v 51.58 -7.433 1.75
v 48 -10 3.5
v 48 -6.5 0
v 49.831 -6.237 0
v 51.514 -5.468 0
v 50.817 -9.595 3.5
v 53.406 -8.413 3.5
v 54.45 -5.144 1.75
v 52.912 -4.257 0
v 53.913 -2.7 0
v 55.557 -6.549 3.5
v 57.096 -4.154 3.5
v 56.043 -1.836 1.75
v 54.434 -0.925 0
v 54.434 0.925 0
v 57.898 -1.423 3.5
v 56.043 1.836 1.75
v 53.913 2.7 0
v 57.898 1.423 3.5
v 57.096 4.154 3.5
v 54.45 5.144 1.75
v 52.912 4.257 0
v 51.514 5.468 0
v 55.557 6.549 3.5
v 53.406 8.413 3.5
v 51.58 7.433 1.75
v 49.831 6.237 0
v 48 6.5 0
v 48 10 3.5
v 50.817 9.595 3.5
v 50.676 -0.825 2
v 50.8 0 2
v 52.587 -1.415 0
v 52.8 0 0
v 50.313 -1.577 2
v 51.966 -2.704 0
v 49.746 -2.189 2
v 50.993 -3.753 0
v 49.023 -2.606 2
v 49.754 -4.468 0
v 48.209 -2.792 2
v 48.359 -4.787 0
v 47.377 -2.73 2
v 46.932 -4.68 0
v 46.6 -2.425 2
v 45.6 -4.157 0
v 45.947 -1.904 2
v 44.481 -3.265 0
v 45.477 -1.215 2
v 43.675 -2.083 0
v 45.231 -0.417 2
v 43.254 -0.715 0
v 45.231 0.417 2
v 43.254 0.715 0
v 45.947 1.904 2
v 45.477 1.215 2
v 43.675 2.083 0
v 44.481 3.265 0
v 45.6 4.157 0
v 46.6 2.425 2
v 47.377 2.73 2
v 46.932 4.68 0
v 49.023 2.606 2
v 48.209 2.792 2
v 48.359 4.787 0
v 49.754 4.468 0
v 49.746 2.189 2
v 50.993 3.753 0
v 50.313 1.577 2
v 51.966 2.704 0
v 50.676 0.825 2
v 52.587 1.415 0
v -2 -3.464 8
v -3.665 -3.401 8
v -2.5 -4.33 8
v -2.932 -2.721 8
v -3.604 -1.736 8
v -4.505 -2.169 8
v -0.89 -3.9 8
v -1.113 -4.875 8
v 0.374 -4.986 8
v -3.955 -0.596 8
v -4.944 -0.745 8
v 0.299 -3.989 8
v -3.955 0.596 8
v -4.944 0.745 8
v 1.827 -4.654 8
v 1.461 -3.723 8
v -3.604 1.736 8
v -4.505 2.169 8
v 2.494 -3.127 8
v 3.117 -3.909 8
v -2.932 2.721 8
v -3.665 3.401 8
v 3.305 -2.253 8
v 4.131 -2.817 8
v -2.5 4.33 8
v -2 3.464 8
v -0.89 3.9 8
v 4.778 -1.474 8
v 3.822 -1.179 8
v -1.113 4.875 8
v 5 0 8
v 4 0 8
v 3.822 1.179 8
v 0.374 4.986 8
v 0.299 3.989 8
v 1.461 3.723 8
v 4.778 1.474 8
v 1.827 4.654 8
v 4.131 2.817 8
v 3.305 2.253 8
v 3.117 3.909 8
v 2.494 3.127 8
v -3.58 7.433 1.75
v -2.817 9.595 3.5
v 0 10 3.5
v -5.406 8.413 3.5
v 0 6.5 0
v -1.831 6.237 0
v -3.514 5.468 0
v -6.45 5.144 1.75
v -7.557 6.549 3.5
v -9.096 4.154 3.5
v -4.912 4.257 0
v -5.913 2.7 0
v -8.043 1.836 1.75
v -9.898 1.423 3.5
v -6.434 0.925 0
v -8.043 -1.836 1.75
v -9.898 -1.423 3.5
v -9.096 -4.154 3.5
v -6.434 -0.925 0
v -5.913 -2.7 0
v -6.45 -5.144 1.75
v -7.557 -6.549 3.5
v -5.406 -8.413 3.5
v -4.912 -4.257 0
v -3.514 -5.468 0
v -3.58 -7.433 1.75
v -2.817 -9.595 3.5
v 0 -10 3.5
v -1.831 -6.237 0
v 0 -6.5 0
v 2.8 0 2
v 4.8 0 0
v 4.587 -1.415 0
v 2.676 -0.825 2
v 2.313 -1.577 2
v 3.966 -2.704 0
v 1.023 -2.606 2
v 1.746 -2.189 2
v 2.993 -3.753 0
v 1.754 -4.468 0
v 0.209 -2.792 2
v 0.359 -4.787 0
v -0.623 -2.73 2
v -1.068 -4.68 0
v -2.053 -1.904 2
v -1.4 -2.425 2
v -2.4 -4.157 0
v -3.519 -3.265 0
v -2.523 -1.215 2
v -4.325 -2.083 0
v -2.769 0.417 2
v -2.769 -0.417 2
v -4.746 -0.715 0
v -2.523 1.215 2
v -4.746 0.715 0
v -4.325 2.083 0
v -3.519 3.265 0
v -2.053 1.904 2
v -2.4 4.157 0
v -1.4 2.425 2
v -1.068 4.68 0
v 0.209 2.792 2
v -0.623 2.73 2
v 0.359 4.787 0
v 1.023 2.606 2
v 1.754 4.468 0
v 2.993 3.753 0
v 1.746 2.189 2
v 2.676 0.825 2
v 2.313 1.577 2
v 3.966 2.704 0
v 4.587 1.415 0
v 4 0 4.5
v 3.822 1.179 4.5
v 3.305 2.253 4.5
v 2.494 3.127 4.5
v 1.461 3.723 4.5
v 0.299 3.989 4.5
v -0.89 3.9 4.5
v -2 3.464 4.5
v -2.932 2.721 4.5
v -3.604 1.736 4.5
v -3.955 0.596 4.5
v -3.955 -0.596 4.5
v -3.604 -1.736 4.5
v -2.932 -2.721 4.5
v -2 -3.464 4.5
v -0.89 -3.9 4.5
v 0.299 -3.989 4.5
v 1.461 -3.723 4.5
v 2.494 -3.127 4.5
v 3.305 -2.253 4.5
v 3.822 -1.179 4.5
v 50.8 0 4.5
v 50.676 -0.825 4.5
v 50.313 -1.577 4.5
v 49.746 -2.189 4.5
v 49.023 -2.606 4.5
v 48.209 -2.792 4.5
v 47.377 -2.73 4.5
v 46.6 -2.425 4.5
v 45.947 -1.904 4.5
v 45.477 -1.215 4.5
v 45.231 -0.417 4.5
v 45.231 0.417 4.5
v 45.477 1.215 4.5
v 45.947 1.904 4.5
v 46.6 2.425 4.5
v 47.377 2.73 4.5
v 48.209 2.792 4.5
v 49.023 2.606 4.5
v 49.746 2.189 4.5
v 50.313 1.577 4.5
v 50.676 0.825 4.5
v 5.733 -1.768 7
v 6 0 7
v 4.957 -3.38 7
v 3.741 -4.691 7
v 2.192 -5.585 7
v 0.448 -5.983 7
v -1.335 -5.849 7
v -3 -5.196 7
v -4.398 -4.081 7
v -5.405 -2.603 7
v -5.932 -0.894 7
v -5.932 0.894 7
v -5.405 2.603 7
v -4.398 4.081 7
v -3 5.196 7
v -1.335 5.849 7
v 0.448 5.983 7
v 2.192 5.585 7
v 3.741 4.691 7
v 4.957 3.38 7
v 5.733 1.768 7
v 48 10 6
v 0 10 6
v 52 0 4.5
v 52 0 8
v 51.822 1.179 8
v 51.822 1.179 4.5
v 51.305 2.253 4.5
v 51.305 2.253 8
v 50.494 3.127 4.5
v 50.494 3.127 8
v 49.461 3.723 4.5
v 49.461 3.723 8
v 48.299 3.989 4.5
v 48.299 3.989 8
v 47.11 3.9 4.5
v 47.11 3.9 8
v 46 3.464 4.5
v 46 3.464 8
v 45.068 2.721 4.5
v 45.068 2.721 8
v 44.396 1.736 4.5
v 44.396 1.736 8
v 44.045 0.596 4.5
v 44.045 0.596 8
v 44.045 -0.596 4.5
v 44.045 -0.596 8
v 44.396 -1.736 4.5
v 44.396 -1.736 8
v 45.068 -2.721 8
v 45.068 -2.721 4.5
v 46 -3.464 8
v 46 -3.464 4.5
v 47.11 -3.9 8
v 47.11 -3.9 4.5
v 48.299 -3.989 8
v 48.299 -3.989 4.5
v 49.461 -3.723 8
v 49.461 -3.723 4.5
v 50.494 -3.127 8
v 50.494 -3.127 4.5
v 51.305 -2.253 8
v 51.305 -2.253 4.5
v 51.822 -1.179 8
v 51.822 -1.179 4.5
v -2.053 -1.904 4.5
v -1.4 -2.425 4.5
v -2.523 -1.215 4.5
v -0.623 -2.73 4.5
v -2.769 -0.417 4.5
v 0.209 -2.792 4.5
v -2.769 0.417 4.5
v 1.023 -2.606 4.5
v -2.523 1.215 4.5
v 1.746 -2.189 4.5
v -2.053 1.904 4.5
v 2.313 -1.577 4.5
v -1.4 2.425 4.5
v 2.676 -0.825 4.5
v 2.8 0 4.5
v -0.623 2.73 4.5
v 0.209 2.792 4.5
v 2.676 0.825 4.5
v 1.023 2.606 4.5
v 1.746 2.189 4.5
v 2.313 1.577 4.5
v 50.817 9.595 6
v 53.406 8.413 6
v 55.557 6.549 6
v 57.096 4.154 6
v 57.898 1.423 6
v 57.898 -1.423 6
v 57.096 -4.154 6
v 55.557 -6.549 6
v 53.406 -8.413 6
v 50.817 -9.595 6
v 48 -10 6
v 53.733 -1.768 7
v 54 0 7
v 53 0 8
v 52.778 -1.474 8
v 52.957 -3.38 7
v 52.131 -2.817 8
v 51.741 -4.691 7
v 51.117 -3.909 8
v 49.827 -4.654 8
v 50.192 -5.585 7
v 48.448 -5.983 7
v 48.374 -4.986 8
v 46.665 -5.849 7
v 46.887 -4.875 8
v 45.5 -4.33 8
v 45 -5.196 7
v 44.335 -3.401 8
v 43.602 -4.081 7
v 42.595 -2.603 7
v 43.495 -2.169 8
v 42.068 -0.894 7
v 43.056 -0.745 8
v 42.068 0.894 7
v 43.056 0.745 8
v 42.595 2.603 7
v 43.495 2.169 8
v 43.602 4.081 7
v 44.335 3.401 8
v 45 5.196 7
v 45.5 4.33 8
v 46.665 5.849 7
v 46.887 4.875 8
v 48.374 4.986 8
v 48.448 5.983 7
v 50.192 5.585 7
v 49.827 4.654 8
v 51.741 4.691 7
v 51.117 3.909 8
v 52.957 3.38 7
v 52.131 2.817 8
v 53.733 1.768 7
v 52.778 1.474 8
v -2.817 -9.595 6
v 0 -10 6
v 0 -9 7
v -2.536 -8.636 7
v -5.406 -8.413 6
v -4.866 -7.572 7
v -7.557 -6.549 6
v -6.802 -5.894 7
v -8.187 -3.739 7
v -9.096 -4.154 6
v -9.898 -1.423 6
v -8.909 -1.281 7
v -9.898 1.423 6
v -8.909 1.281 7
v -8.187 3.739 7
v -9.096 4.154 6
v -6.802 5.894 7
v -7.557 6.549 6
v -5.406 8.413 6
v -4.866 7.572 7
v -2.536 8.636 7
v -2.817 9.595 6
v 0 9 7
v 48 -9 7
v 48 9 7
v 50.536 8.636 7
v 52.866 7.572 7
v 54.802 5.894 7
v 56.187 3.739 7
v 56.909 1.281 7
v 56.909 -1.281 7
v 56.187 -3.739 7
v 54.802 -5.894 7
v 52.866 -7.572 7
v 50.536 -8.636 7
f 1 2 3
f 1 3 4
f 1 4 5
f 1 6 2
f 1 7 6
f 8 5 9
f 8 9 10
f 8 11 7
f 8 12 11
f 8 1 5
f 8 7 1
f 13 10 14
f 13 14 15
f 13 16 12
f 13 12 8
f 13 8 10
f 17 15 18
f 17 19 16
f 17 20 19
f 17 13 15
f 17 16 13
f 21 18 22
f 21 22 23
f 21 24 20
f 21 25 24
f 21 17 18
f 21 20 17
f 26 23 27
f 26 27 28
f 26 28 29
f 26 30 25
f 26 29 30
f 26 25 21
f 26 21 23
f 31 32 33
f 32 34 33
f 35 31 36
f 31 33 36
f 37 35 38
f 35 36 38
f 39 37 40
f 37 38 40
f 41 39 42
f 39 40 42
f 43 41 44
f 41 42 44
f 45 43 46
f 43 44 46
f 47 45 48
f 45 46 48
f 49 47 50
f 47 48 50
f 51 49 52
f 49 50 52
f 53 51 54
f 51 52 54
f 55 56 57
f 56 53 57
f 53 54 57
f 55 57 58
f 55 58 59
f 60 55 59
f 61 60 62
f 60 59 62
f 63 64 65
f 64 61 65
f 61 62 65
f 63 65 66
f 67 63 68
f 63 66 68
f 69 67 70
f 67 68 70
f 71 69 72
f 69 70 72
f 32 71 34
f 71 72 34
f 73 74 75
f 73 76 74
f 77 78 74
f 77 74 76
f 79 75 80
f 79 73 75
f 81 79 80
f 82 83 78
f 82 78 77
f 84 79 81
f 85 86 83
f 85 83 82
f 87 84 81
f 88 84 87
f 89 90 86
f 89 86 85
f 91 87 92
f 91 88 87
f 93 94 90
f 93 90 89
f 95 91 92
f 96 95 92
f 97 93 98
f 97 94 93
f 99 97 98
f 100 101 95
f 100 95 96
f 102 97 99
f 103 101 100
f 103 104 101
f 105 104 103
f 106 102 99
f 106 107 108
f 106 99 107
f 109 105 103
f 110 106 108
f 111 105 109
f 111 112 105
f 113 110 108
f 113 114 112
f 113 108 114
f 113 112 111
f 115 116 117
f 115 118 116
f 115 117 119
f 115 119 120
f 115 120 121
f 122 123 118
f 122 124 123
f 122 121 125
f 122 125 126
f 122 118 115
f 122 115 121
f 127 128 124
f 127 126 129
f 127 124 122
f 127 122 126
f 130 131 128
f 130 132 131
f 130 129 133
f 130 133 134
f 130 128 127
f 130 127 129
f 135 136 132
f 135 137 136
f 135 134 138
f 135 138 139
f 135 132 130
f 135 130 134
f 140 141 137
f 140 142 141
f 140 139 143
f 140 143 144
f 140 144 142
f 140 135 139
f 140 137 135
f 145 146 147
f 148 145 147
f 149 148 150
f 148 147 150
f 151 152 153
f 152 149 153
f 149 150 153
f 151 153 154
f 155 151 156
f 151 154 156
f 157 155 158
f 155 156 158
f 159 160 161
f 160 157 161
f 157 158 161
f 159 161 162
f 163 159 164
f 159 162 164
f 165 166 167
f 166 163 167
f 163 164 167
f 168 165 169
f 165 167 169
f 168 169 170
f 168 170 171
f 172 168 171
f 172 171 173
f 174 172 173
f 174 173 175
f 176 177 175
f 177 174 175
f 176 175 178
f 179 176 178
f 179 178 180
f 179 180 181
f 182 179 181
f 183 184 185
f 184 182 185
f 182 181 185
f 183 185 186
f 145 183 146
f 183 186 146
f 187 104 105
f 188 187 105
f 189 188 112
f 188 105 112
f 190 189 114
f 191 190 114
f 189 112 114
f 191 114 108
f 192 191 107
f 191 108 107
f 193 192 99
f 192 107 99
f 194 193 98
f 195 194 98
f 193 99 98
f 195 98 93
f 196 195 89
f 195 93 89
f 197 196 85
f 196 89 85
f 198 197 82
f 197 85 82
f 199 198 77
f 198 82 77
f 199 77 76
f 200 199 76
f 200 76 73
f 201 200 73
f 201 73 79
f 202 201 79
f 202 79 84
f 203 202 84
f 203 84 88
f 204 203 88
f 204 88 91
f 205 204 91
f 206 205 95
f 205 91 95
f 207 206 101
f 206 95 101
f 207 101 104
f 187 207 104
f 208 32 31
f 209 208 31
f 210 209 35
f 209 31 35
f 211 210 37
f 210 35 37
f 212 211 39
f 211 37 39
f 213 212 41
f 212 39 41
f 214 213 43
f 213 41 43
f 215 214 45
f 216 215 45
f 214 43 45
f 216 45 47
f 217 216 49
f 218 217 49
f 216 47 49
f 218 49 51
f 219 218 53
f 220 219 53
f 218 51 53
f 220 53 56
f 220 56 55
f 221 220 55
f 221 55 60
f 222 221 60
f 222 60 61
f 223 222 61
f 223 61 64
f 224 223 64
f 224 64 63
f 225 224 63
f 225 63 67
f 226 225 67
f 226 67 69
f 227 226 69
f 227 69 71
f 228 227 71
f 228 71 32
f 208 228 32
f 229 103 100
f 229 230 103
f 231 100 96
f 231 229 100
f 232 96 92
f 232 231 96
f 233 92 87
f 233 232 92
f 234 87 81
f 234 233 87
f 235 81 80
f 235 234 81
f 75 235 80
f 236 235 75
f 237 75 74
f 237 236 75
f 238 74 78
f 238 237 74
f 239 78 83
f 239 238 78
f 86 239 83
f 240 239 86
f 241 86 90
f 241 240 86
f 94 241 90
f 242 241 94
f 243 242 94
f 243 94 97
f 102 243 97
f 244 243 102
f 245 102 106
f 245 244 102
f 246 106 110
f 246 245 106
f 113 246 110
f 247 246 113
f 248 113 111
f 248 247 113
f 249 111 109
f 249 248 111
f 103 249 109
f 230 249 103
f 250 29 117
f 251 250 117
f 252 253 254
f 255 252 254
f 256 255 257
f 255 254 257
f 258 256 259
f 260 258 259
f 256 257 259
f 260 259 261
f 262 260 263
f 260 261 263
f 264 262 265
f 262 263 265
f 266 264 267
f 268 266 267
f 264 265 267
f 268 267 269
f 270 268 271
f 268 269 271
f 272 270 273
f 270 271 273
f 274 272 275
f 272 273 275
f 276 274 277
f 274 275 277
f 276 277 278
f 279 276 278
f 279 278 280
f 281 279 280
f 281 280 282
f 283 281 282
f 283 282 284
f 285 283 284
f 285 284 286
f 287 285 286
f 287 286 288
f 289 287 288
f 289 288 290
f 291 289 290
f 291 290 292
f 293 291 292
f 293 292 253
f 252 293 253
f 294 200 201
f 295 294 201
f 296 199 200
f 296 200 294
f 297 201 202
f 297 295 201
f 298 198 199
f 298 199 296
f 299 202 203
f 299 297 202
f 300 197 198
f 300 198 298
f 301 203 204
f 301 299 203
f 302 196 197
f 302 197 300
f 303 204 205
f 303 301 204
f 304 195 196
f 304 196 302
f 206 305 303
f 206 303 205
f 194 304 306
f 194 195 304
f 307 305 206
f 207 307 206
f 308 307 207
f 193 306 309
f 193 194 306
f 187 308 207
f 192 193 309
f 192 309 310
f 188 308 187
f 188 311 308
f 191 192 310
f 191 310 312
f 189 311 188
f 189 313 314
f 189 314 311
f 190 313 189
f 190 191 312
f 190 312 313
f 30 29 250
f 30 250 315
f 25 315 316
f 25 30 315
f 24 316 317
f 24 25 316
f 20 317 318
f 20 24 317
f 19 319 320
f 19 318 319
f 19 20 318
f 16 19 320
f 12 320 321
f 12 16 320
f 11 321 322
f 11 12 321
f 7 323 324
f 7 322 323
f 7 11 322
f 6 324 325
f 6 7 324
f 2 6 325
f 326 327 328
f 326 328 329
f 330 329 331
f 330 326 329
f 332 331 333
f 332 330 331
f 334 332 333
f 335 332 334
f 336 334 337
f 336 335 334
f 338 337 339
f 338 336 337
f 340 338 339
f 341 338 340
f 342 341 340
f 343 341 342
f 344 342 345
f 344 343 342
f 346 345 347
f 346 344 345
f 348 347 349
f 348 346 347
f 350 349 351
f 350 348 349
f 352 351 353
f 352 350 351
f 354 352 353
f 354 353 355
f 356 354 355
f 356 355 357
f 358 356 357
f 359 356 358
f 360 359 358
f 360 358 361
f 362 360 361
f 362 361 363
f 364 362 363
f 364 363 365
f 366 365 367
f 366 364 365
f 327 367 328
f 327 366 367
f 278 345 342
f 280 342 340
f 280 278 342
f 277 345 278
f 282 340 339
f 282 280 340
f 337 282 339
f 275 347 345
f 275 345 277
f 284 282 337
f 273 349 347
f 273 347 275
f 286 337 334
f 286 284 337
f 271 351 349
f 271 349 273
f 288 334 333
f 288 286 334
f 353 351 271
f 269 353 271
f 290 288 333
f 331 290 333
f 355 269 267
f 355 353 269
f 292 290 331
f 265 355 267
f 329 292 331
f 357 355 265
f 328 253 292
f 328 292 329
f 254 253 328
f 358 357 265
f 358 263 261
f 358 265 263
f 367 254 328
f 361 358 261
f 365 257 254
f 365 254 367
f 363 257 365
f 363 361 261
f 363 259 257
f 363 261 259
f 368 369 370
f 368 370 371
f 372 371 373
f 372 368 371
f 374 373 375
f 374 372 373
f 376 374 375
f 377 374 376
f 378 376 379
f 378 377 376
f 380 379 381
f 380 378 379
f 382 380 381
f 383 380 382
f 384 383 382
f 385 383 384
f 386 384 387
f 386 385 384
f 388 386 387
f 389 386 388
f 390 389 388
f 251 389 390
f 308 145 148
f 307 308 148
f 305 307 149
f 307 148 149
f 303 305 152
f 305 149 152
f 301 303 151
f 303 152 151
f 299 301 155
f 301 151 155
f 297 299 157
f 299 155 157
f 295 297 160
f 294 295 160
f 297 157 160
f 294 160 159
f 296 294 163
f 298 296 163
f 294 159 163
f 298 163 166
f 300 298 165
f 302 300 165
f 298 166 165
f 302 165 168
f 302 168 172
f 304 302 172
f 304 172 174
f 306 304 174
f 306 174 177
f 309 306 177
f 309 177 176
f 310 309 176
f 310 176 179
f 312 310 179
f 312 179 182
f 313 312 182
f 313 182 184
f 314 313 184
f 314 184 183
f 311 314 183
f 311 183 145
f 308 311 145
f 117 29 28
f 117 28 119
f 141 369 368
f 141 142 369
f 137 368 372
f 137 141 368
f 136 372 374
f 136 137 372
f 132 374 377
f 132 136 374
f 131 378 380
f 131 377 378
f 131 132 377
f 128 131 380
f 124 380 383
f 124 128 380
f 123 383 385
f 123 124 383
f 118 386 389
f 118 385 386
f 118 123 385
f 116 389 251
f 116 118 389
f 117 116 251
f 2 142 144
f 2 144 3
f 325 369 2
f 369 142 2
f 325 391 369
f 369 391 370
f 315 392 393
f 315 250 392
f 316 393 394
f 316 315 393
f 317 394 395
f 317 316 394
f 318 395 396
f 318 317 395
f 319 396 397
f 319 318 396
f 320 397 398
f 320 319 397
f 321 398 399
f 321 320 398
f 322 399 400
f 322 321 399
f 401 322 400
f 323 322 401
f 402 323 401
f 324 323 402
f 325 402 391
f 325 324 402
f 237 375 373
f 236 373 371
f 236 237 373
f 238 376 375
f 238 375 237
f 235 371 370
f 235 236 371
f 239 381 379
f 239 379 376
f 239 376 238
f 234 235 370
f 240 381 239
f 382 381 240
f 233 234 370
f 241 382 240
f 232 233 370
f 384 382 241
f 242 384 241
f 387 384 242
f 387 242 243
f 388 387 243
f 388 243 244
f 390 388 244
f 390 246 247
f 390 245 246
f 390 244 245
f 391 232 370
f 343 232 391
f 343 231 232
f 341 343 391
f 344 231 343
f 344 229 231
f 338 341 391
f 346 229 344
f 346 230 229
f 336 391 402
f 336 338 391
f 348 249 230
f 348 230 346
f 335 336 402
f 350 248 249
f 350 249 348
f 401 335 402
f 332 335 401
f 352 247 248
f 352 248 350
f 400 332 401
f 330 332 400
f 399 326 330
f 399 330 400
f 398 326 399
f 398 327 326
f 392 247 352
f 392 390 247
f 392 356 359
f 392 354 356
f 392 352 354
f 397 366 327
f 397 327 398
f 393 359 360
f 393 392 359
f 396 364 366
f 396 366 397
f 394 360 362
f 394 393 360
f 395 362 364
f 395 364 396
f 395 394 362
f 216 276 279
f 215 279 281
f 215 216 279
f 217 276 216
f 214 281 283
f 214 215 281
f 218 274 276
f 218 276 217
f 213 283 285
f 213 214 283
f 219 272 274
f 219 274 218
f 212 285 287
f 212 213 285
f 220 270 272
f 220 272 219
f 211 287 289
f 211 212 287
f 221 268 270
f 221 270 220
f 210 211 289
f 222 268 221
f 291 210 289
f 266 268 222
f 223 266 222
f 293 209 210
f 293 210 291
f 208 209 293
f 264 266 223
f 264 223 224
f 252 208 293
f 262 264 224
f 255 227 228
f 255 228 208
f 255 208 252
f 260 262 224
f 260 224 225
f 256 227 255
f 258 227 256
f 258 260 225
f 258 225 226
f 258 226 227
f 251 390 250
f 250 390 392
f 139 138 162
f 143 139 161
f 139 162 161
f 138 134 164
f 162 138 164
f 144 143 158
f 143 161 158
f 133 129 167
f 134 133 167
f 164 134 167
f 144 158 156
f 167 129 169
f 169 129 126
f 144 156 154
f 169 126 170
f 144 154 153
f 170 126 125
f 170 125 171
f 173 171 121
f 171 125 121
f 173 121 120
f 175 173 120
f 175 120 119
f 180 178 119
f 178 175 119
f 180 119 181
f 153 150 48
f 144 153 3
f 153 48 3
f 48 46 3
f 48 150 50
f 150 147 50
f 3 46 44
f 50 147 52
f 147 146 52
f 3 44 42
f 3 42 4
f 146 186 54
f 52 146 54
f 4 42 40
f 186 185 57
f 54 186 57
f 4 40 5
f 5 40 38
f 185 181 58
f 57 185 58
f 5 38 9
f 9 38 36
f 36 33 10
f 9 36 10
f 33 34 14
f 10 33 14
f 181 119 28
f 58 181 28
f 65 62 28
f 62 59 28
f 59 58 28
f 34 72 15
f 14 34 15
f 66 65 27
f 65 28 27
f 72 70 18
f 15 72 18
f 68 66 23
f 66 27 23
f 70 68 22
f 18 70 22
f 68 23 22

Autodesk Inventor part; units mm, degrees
ref_plane "YZ Plane" through (0, 0, 0) normal (1, 0, 0) x (0, 1, 0)
ref_plane "XZ Plane" through (0, 0, 0) normal (0, 1, 0) x (-1, 0, 0)
ref_plane "XY Plane" through (0, 0, 0) normal (0, 0, 1) x (1, 0, 0)
sketch "Эскиз1" plane through (0, 0, 0) normal (0, 0, 1) x (1, 0, 0)
  line L0 (0, 0) -> (48, 0) construction
  line L1 (0, -10) -> (48, -10)
  line L2 (48, 10) -> (0, 10)
  arc A0 (0, 10) -> (0, -10) centre (0, 0) ccw
  arc A1 (48, -10) -> (48, 10) centre (48, 0) ccw
  circle A2 centre (0, 0) radius 2.8
  circle A3 centre (48, 0) radius 2.8
  point P0 (24, 0)
  dimension "d0" = 48
  dimension "d1" = 20
  dimension "d2" = 5.6
  dimension "d3" = 5.6
extrude "Выдавливание1" add sketch "Эскиз1" along normal blind 7
chamfer "Фаска1" distance 2 angle 45 2 edges at (-2.8, 0, 0) (45.2, 0, 0)
chamfer "Фаска2" distance 3.5 angle 45 4 edges at (24, 10, 0) (-10, 0, 0) (24, -10, 0) (58, 0, 0)
sketch "Эскиз3" plane through (0, 0, 7) normal (0, 0, 1) x (1, 0, 0)
  circle A0 centre (0, 0) radius 5
  circle A1 centre (48, 0) radius 5
  circle A2 centre (0, 0) radius 2.8 projected
  circle A3 centre (48, 0) radius 2.8 projected
  dimension "d19" = 10
extrude "Выдавливание3" add sketch "Эскиз3" along normal blind 1
chamfer "Фаска4" distance 1 angle 45 6 edges at (24, 10, 7) (-10, 0, 7) (24, -10, 7) (58, 0, 7) (43, 0, 7) (-5, 0, 7)
sketch "Эскиз4" plane through (0, 0, 8) normal (0, 0, 1) x (1, 0, 0)
  circle A0 centre (0, 0) radius 4
  circle A1 centre (48, 0) radius 2.8 projected
  circle A2 centre (48, 0) radius 4
  dimension "d26" = 8
extrude "Выдавливание4" cut sketch "Эскиз4" against normal blind 3.5 contours A0 | A1 | A2
properties part number "Распорка роликов натяжителя"
